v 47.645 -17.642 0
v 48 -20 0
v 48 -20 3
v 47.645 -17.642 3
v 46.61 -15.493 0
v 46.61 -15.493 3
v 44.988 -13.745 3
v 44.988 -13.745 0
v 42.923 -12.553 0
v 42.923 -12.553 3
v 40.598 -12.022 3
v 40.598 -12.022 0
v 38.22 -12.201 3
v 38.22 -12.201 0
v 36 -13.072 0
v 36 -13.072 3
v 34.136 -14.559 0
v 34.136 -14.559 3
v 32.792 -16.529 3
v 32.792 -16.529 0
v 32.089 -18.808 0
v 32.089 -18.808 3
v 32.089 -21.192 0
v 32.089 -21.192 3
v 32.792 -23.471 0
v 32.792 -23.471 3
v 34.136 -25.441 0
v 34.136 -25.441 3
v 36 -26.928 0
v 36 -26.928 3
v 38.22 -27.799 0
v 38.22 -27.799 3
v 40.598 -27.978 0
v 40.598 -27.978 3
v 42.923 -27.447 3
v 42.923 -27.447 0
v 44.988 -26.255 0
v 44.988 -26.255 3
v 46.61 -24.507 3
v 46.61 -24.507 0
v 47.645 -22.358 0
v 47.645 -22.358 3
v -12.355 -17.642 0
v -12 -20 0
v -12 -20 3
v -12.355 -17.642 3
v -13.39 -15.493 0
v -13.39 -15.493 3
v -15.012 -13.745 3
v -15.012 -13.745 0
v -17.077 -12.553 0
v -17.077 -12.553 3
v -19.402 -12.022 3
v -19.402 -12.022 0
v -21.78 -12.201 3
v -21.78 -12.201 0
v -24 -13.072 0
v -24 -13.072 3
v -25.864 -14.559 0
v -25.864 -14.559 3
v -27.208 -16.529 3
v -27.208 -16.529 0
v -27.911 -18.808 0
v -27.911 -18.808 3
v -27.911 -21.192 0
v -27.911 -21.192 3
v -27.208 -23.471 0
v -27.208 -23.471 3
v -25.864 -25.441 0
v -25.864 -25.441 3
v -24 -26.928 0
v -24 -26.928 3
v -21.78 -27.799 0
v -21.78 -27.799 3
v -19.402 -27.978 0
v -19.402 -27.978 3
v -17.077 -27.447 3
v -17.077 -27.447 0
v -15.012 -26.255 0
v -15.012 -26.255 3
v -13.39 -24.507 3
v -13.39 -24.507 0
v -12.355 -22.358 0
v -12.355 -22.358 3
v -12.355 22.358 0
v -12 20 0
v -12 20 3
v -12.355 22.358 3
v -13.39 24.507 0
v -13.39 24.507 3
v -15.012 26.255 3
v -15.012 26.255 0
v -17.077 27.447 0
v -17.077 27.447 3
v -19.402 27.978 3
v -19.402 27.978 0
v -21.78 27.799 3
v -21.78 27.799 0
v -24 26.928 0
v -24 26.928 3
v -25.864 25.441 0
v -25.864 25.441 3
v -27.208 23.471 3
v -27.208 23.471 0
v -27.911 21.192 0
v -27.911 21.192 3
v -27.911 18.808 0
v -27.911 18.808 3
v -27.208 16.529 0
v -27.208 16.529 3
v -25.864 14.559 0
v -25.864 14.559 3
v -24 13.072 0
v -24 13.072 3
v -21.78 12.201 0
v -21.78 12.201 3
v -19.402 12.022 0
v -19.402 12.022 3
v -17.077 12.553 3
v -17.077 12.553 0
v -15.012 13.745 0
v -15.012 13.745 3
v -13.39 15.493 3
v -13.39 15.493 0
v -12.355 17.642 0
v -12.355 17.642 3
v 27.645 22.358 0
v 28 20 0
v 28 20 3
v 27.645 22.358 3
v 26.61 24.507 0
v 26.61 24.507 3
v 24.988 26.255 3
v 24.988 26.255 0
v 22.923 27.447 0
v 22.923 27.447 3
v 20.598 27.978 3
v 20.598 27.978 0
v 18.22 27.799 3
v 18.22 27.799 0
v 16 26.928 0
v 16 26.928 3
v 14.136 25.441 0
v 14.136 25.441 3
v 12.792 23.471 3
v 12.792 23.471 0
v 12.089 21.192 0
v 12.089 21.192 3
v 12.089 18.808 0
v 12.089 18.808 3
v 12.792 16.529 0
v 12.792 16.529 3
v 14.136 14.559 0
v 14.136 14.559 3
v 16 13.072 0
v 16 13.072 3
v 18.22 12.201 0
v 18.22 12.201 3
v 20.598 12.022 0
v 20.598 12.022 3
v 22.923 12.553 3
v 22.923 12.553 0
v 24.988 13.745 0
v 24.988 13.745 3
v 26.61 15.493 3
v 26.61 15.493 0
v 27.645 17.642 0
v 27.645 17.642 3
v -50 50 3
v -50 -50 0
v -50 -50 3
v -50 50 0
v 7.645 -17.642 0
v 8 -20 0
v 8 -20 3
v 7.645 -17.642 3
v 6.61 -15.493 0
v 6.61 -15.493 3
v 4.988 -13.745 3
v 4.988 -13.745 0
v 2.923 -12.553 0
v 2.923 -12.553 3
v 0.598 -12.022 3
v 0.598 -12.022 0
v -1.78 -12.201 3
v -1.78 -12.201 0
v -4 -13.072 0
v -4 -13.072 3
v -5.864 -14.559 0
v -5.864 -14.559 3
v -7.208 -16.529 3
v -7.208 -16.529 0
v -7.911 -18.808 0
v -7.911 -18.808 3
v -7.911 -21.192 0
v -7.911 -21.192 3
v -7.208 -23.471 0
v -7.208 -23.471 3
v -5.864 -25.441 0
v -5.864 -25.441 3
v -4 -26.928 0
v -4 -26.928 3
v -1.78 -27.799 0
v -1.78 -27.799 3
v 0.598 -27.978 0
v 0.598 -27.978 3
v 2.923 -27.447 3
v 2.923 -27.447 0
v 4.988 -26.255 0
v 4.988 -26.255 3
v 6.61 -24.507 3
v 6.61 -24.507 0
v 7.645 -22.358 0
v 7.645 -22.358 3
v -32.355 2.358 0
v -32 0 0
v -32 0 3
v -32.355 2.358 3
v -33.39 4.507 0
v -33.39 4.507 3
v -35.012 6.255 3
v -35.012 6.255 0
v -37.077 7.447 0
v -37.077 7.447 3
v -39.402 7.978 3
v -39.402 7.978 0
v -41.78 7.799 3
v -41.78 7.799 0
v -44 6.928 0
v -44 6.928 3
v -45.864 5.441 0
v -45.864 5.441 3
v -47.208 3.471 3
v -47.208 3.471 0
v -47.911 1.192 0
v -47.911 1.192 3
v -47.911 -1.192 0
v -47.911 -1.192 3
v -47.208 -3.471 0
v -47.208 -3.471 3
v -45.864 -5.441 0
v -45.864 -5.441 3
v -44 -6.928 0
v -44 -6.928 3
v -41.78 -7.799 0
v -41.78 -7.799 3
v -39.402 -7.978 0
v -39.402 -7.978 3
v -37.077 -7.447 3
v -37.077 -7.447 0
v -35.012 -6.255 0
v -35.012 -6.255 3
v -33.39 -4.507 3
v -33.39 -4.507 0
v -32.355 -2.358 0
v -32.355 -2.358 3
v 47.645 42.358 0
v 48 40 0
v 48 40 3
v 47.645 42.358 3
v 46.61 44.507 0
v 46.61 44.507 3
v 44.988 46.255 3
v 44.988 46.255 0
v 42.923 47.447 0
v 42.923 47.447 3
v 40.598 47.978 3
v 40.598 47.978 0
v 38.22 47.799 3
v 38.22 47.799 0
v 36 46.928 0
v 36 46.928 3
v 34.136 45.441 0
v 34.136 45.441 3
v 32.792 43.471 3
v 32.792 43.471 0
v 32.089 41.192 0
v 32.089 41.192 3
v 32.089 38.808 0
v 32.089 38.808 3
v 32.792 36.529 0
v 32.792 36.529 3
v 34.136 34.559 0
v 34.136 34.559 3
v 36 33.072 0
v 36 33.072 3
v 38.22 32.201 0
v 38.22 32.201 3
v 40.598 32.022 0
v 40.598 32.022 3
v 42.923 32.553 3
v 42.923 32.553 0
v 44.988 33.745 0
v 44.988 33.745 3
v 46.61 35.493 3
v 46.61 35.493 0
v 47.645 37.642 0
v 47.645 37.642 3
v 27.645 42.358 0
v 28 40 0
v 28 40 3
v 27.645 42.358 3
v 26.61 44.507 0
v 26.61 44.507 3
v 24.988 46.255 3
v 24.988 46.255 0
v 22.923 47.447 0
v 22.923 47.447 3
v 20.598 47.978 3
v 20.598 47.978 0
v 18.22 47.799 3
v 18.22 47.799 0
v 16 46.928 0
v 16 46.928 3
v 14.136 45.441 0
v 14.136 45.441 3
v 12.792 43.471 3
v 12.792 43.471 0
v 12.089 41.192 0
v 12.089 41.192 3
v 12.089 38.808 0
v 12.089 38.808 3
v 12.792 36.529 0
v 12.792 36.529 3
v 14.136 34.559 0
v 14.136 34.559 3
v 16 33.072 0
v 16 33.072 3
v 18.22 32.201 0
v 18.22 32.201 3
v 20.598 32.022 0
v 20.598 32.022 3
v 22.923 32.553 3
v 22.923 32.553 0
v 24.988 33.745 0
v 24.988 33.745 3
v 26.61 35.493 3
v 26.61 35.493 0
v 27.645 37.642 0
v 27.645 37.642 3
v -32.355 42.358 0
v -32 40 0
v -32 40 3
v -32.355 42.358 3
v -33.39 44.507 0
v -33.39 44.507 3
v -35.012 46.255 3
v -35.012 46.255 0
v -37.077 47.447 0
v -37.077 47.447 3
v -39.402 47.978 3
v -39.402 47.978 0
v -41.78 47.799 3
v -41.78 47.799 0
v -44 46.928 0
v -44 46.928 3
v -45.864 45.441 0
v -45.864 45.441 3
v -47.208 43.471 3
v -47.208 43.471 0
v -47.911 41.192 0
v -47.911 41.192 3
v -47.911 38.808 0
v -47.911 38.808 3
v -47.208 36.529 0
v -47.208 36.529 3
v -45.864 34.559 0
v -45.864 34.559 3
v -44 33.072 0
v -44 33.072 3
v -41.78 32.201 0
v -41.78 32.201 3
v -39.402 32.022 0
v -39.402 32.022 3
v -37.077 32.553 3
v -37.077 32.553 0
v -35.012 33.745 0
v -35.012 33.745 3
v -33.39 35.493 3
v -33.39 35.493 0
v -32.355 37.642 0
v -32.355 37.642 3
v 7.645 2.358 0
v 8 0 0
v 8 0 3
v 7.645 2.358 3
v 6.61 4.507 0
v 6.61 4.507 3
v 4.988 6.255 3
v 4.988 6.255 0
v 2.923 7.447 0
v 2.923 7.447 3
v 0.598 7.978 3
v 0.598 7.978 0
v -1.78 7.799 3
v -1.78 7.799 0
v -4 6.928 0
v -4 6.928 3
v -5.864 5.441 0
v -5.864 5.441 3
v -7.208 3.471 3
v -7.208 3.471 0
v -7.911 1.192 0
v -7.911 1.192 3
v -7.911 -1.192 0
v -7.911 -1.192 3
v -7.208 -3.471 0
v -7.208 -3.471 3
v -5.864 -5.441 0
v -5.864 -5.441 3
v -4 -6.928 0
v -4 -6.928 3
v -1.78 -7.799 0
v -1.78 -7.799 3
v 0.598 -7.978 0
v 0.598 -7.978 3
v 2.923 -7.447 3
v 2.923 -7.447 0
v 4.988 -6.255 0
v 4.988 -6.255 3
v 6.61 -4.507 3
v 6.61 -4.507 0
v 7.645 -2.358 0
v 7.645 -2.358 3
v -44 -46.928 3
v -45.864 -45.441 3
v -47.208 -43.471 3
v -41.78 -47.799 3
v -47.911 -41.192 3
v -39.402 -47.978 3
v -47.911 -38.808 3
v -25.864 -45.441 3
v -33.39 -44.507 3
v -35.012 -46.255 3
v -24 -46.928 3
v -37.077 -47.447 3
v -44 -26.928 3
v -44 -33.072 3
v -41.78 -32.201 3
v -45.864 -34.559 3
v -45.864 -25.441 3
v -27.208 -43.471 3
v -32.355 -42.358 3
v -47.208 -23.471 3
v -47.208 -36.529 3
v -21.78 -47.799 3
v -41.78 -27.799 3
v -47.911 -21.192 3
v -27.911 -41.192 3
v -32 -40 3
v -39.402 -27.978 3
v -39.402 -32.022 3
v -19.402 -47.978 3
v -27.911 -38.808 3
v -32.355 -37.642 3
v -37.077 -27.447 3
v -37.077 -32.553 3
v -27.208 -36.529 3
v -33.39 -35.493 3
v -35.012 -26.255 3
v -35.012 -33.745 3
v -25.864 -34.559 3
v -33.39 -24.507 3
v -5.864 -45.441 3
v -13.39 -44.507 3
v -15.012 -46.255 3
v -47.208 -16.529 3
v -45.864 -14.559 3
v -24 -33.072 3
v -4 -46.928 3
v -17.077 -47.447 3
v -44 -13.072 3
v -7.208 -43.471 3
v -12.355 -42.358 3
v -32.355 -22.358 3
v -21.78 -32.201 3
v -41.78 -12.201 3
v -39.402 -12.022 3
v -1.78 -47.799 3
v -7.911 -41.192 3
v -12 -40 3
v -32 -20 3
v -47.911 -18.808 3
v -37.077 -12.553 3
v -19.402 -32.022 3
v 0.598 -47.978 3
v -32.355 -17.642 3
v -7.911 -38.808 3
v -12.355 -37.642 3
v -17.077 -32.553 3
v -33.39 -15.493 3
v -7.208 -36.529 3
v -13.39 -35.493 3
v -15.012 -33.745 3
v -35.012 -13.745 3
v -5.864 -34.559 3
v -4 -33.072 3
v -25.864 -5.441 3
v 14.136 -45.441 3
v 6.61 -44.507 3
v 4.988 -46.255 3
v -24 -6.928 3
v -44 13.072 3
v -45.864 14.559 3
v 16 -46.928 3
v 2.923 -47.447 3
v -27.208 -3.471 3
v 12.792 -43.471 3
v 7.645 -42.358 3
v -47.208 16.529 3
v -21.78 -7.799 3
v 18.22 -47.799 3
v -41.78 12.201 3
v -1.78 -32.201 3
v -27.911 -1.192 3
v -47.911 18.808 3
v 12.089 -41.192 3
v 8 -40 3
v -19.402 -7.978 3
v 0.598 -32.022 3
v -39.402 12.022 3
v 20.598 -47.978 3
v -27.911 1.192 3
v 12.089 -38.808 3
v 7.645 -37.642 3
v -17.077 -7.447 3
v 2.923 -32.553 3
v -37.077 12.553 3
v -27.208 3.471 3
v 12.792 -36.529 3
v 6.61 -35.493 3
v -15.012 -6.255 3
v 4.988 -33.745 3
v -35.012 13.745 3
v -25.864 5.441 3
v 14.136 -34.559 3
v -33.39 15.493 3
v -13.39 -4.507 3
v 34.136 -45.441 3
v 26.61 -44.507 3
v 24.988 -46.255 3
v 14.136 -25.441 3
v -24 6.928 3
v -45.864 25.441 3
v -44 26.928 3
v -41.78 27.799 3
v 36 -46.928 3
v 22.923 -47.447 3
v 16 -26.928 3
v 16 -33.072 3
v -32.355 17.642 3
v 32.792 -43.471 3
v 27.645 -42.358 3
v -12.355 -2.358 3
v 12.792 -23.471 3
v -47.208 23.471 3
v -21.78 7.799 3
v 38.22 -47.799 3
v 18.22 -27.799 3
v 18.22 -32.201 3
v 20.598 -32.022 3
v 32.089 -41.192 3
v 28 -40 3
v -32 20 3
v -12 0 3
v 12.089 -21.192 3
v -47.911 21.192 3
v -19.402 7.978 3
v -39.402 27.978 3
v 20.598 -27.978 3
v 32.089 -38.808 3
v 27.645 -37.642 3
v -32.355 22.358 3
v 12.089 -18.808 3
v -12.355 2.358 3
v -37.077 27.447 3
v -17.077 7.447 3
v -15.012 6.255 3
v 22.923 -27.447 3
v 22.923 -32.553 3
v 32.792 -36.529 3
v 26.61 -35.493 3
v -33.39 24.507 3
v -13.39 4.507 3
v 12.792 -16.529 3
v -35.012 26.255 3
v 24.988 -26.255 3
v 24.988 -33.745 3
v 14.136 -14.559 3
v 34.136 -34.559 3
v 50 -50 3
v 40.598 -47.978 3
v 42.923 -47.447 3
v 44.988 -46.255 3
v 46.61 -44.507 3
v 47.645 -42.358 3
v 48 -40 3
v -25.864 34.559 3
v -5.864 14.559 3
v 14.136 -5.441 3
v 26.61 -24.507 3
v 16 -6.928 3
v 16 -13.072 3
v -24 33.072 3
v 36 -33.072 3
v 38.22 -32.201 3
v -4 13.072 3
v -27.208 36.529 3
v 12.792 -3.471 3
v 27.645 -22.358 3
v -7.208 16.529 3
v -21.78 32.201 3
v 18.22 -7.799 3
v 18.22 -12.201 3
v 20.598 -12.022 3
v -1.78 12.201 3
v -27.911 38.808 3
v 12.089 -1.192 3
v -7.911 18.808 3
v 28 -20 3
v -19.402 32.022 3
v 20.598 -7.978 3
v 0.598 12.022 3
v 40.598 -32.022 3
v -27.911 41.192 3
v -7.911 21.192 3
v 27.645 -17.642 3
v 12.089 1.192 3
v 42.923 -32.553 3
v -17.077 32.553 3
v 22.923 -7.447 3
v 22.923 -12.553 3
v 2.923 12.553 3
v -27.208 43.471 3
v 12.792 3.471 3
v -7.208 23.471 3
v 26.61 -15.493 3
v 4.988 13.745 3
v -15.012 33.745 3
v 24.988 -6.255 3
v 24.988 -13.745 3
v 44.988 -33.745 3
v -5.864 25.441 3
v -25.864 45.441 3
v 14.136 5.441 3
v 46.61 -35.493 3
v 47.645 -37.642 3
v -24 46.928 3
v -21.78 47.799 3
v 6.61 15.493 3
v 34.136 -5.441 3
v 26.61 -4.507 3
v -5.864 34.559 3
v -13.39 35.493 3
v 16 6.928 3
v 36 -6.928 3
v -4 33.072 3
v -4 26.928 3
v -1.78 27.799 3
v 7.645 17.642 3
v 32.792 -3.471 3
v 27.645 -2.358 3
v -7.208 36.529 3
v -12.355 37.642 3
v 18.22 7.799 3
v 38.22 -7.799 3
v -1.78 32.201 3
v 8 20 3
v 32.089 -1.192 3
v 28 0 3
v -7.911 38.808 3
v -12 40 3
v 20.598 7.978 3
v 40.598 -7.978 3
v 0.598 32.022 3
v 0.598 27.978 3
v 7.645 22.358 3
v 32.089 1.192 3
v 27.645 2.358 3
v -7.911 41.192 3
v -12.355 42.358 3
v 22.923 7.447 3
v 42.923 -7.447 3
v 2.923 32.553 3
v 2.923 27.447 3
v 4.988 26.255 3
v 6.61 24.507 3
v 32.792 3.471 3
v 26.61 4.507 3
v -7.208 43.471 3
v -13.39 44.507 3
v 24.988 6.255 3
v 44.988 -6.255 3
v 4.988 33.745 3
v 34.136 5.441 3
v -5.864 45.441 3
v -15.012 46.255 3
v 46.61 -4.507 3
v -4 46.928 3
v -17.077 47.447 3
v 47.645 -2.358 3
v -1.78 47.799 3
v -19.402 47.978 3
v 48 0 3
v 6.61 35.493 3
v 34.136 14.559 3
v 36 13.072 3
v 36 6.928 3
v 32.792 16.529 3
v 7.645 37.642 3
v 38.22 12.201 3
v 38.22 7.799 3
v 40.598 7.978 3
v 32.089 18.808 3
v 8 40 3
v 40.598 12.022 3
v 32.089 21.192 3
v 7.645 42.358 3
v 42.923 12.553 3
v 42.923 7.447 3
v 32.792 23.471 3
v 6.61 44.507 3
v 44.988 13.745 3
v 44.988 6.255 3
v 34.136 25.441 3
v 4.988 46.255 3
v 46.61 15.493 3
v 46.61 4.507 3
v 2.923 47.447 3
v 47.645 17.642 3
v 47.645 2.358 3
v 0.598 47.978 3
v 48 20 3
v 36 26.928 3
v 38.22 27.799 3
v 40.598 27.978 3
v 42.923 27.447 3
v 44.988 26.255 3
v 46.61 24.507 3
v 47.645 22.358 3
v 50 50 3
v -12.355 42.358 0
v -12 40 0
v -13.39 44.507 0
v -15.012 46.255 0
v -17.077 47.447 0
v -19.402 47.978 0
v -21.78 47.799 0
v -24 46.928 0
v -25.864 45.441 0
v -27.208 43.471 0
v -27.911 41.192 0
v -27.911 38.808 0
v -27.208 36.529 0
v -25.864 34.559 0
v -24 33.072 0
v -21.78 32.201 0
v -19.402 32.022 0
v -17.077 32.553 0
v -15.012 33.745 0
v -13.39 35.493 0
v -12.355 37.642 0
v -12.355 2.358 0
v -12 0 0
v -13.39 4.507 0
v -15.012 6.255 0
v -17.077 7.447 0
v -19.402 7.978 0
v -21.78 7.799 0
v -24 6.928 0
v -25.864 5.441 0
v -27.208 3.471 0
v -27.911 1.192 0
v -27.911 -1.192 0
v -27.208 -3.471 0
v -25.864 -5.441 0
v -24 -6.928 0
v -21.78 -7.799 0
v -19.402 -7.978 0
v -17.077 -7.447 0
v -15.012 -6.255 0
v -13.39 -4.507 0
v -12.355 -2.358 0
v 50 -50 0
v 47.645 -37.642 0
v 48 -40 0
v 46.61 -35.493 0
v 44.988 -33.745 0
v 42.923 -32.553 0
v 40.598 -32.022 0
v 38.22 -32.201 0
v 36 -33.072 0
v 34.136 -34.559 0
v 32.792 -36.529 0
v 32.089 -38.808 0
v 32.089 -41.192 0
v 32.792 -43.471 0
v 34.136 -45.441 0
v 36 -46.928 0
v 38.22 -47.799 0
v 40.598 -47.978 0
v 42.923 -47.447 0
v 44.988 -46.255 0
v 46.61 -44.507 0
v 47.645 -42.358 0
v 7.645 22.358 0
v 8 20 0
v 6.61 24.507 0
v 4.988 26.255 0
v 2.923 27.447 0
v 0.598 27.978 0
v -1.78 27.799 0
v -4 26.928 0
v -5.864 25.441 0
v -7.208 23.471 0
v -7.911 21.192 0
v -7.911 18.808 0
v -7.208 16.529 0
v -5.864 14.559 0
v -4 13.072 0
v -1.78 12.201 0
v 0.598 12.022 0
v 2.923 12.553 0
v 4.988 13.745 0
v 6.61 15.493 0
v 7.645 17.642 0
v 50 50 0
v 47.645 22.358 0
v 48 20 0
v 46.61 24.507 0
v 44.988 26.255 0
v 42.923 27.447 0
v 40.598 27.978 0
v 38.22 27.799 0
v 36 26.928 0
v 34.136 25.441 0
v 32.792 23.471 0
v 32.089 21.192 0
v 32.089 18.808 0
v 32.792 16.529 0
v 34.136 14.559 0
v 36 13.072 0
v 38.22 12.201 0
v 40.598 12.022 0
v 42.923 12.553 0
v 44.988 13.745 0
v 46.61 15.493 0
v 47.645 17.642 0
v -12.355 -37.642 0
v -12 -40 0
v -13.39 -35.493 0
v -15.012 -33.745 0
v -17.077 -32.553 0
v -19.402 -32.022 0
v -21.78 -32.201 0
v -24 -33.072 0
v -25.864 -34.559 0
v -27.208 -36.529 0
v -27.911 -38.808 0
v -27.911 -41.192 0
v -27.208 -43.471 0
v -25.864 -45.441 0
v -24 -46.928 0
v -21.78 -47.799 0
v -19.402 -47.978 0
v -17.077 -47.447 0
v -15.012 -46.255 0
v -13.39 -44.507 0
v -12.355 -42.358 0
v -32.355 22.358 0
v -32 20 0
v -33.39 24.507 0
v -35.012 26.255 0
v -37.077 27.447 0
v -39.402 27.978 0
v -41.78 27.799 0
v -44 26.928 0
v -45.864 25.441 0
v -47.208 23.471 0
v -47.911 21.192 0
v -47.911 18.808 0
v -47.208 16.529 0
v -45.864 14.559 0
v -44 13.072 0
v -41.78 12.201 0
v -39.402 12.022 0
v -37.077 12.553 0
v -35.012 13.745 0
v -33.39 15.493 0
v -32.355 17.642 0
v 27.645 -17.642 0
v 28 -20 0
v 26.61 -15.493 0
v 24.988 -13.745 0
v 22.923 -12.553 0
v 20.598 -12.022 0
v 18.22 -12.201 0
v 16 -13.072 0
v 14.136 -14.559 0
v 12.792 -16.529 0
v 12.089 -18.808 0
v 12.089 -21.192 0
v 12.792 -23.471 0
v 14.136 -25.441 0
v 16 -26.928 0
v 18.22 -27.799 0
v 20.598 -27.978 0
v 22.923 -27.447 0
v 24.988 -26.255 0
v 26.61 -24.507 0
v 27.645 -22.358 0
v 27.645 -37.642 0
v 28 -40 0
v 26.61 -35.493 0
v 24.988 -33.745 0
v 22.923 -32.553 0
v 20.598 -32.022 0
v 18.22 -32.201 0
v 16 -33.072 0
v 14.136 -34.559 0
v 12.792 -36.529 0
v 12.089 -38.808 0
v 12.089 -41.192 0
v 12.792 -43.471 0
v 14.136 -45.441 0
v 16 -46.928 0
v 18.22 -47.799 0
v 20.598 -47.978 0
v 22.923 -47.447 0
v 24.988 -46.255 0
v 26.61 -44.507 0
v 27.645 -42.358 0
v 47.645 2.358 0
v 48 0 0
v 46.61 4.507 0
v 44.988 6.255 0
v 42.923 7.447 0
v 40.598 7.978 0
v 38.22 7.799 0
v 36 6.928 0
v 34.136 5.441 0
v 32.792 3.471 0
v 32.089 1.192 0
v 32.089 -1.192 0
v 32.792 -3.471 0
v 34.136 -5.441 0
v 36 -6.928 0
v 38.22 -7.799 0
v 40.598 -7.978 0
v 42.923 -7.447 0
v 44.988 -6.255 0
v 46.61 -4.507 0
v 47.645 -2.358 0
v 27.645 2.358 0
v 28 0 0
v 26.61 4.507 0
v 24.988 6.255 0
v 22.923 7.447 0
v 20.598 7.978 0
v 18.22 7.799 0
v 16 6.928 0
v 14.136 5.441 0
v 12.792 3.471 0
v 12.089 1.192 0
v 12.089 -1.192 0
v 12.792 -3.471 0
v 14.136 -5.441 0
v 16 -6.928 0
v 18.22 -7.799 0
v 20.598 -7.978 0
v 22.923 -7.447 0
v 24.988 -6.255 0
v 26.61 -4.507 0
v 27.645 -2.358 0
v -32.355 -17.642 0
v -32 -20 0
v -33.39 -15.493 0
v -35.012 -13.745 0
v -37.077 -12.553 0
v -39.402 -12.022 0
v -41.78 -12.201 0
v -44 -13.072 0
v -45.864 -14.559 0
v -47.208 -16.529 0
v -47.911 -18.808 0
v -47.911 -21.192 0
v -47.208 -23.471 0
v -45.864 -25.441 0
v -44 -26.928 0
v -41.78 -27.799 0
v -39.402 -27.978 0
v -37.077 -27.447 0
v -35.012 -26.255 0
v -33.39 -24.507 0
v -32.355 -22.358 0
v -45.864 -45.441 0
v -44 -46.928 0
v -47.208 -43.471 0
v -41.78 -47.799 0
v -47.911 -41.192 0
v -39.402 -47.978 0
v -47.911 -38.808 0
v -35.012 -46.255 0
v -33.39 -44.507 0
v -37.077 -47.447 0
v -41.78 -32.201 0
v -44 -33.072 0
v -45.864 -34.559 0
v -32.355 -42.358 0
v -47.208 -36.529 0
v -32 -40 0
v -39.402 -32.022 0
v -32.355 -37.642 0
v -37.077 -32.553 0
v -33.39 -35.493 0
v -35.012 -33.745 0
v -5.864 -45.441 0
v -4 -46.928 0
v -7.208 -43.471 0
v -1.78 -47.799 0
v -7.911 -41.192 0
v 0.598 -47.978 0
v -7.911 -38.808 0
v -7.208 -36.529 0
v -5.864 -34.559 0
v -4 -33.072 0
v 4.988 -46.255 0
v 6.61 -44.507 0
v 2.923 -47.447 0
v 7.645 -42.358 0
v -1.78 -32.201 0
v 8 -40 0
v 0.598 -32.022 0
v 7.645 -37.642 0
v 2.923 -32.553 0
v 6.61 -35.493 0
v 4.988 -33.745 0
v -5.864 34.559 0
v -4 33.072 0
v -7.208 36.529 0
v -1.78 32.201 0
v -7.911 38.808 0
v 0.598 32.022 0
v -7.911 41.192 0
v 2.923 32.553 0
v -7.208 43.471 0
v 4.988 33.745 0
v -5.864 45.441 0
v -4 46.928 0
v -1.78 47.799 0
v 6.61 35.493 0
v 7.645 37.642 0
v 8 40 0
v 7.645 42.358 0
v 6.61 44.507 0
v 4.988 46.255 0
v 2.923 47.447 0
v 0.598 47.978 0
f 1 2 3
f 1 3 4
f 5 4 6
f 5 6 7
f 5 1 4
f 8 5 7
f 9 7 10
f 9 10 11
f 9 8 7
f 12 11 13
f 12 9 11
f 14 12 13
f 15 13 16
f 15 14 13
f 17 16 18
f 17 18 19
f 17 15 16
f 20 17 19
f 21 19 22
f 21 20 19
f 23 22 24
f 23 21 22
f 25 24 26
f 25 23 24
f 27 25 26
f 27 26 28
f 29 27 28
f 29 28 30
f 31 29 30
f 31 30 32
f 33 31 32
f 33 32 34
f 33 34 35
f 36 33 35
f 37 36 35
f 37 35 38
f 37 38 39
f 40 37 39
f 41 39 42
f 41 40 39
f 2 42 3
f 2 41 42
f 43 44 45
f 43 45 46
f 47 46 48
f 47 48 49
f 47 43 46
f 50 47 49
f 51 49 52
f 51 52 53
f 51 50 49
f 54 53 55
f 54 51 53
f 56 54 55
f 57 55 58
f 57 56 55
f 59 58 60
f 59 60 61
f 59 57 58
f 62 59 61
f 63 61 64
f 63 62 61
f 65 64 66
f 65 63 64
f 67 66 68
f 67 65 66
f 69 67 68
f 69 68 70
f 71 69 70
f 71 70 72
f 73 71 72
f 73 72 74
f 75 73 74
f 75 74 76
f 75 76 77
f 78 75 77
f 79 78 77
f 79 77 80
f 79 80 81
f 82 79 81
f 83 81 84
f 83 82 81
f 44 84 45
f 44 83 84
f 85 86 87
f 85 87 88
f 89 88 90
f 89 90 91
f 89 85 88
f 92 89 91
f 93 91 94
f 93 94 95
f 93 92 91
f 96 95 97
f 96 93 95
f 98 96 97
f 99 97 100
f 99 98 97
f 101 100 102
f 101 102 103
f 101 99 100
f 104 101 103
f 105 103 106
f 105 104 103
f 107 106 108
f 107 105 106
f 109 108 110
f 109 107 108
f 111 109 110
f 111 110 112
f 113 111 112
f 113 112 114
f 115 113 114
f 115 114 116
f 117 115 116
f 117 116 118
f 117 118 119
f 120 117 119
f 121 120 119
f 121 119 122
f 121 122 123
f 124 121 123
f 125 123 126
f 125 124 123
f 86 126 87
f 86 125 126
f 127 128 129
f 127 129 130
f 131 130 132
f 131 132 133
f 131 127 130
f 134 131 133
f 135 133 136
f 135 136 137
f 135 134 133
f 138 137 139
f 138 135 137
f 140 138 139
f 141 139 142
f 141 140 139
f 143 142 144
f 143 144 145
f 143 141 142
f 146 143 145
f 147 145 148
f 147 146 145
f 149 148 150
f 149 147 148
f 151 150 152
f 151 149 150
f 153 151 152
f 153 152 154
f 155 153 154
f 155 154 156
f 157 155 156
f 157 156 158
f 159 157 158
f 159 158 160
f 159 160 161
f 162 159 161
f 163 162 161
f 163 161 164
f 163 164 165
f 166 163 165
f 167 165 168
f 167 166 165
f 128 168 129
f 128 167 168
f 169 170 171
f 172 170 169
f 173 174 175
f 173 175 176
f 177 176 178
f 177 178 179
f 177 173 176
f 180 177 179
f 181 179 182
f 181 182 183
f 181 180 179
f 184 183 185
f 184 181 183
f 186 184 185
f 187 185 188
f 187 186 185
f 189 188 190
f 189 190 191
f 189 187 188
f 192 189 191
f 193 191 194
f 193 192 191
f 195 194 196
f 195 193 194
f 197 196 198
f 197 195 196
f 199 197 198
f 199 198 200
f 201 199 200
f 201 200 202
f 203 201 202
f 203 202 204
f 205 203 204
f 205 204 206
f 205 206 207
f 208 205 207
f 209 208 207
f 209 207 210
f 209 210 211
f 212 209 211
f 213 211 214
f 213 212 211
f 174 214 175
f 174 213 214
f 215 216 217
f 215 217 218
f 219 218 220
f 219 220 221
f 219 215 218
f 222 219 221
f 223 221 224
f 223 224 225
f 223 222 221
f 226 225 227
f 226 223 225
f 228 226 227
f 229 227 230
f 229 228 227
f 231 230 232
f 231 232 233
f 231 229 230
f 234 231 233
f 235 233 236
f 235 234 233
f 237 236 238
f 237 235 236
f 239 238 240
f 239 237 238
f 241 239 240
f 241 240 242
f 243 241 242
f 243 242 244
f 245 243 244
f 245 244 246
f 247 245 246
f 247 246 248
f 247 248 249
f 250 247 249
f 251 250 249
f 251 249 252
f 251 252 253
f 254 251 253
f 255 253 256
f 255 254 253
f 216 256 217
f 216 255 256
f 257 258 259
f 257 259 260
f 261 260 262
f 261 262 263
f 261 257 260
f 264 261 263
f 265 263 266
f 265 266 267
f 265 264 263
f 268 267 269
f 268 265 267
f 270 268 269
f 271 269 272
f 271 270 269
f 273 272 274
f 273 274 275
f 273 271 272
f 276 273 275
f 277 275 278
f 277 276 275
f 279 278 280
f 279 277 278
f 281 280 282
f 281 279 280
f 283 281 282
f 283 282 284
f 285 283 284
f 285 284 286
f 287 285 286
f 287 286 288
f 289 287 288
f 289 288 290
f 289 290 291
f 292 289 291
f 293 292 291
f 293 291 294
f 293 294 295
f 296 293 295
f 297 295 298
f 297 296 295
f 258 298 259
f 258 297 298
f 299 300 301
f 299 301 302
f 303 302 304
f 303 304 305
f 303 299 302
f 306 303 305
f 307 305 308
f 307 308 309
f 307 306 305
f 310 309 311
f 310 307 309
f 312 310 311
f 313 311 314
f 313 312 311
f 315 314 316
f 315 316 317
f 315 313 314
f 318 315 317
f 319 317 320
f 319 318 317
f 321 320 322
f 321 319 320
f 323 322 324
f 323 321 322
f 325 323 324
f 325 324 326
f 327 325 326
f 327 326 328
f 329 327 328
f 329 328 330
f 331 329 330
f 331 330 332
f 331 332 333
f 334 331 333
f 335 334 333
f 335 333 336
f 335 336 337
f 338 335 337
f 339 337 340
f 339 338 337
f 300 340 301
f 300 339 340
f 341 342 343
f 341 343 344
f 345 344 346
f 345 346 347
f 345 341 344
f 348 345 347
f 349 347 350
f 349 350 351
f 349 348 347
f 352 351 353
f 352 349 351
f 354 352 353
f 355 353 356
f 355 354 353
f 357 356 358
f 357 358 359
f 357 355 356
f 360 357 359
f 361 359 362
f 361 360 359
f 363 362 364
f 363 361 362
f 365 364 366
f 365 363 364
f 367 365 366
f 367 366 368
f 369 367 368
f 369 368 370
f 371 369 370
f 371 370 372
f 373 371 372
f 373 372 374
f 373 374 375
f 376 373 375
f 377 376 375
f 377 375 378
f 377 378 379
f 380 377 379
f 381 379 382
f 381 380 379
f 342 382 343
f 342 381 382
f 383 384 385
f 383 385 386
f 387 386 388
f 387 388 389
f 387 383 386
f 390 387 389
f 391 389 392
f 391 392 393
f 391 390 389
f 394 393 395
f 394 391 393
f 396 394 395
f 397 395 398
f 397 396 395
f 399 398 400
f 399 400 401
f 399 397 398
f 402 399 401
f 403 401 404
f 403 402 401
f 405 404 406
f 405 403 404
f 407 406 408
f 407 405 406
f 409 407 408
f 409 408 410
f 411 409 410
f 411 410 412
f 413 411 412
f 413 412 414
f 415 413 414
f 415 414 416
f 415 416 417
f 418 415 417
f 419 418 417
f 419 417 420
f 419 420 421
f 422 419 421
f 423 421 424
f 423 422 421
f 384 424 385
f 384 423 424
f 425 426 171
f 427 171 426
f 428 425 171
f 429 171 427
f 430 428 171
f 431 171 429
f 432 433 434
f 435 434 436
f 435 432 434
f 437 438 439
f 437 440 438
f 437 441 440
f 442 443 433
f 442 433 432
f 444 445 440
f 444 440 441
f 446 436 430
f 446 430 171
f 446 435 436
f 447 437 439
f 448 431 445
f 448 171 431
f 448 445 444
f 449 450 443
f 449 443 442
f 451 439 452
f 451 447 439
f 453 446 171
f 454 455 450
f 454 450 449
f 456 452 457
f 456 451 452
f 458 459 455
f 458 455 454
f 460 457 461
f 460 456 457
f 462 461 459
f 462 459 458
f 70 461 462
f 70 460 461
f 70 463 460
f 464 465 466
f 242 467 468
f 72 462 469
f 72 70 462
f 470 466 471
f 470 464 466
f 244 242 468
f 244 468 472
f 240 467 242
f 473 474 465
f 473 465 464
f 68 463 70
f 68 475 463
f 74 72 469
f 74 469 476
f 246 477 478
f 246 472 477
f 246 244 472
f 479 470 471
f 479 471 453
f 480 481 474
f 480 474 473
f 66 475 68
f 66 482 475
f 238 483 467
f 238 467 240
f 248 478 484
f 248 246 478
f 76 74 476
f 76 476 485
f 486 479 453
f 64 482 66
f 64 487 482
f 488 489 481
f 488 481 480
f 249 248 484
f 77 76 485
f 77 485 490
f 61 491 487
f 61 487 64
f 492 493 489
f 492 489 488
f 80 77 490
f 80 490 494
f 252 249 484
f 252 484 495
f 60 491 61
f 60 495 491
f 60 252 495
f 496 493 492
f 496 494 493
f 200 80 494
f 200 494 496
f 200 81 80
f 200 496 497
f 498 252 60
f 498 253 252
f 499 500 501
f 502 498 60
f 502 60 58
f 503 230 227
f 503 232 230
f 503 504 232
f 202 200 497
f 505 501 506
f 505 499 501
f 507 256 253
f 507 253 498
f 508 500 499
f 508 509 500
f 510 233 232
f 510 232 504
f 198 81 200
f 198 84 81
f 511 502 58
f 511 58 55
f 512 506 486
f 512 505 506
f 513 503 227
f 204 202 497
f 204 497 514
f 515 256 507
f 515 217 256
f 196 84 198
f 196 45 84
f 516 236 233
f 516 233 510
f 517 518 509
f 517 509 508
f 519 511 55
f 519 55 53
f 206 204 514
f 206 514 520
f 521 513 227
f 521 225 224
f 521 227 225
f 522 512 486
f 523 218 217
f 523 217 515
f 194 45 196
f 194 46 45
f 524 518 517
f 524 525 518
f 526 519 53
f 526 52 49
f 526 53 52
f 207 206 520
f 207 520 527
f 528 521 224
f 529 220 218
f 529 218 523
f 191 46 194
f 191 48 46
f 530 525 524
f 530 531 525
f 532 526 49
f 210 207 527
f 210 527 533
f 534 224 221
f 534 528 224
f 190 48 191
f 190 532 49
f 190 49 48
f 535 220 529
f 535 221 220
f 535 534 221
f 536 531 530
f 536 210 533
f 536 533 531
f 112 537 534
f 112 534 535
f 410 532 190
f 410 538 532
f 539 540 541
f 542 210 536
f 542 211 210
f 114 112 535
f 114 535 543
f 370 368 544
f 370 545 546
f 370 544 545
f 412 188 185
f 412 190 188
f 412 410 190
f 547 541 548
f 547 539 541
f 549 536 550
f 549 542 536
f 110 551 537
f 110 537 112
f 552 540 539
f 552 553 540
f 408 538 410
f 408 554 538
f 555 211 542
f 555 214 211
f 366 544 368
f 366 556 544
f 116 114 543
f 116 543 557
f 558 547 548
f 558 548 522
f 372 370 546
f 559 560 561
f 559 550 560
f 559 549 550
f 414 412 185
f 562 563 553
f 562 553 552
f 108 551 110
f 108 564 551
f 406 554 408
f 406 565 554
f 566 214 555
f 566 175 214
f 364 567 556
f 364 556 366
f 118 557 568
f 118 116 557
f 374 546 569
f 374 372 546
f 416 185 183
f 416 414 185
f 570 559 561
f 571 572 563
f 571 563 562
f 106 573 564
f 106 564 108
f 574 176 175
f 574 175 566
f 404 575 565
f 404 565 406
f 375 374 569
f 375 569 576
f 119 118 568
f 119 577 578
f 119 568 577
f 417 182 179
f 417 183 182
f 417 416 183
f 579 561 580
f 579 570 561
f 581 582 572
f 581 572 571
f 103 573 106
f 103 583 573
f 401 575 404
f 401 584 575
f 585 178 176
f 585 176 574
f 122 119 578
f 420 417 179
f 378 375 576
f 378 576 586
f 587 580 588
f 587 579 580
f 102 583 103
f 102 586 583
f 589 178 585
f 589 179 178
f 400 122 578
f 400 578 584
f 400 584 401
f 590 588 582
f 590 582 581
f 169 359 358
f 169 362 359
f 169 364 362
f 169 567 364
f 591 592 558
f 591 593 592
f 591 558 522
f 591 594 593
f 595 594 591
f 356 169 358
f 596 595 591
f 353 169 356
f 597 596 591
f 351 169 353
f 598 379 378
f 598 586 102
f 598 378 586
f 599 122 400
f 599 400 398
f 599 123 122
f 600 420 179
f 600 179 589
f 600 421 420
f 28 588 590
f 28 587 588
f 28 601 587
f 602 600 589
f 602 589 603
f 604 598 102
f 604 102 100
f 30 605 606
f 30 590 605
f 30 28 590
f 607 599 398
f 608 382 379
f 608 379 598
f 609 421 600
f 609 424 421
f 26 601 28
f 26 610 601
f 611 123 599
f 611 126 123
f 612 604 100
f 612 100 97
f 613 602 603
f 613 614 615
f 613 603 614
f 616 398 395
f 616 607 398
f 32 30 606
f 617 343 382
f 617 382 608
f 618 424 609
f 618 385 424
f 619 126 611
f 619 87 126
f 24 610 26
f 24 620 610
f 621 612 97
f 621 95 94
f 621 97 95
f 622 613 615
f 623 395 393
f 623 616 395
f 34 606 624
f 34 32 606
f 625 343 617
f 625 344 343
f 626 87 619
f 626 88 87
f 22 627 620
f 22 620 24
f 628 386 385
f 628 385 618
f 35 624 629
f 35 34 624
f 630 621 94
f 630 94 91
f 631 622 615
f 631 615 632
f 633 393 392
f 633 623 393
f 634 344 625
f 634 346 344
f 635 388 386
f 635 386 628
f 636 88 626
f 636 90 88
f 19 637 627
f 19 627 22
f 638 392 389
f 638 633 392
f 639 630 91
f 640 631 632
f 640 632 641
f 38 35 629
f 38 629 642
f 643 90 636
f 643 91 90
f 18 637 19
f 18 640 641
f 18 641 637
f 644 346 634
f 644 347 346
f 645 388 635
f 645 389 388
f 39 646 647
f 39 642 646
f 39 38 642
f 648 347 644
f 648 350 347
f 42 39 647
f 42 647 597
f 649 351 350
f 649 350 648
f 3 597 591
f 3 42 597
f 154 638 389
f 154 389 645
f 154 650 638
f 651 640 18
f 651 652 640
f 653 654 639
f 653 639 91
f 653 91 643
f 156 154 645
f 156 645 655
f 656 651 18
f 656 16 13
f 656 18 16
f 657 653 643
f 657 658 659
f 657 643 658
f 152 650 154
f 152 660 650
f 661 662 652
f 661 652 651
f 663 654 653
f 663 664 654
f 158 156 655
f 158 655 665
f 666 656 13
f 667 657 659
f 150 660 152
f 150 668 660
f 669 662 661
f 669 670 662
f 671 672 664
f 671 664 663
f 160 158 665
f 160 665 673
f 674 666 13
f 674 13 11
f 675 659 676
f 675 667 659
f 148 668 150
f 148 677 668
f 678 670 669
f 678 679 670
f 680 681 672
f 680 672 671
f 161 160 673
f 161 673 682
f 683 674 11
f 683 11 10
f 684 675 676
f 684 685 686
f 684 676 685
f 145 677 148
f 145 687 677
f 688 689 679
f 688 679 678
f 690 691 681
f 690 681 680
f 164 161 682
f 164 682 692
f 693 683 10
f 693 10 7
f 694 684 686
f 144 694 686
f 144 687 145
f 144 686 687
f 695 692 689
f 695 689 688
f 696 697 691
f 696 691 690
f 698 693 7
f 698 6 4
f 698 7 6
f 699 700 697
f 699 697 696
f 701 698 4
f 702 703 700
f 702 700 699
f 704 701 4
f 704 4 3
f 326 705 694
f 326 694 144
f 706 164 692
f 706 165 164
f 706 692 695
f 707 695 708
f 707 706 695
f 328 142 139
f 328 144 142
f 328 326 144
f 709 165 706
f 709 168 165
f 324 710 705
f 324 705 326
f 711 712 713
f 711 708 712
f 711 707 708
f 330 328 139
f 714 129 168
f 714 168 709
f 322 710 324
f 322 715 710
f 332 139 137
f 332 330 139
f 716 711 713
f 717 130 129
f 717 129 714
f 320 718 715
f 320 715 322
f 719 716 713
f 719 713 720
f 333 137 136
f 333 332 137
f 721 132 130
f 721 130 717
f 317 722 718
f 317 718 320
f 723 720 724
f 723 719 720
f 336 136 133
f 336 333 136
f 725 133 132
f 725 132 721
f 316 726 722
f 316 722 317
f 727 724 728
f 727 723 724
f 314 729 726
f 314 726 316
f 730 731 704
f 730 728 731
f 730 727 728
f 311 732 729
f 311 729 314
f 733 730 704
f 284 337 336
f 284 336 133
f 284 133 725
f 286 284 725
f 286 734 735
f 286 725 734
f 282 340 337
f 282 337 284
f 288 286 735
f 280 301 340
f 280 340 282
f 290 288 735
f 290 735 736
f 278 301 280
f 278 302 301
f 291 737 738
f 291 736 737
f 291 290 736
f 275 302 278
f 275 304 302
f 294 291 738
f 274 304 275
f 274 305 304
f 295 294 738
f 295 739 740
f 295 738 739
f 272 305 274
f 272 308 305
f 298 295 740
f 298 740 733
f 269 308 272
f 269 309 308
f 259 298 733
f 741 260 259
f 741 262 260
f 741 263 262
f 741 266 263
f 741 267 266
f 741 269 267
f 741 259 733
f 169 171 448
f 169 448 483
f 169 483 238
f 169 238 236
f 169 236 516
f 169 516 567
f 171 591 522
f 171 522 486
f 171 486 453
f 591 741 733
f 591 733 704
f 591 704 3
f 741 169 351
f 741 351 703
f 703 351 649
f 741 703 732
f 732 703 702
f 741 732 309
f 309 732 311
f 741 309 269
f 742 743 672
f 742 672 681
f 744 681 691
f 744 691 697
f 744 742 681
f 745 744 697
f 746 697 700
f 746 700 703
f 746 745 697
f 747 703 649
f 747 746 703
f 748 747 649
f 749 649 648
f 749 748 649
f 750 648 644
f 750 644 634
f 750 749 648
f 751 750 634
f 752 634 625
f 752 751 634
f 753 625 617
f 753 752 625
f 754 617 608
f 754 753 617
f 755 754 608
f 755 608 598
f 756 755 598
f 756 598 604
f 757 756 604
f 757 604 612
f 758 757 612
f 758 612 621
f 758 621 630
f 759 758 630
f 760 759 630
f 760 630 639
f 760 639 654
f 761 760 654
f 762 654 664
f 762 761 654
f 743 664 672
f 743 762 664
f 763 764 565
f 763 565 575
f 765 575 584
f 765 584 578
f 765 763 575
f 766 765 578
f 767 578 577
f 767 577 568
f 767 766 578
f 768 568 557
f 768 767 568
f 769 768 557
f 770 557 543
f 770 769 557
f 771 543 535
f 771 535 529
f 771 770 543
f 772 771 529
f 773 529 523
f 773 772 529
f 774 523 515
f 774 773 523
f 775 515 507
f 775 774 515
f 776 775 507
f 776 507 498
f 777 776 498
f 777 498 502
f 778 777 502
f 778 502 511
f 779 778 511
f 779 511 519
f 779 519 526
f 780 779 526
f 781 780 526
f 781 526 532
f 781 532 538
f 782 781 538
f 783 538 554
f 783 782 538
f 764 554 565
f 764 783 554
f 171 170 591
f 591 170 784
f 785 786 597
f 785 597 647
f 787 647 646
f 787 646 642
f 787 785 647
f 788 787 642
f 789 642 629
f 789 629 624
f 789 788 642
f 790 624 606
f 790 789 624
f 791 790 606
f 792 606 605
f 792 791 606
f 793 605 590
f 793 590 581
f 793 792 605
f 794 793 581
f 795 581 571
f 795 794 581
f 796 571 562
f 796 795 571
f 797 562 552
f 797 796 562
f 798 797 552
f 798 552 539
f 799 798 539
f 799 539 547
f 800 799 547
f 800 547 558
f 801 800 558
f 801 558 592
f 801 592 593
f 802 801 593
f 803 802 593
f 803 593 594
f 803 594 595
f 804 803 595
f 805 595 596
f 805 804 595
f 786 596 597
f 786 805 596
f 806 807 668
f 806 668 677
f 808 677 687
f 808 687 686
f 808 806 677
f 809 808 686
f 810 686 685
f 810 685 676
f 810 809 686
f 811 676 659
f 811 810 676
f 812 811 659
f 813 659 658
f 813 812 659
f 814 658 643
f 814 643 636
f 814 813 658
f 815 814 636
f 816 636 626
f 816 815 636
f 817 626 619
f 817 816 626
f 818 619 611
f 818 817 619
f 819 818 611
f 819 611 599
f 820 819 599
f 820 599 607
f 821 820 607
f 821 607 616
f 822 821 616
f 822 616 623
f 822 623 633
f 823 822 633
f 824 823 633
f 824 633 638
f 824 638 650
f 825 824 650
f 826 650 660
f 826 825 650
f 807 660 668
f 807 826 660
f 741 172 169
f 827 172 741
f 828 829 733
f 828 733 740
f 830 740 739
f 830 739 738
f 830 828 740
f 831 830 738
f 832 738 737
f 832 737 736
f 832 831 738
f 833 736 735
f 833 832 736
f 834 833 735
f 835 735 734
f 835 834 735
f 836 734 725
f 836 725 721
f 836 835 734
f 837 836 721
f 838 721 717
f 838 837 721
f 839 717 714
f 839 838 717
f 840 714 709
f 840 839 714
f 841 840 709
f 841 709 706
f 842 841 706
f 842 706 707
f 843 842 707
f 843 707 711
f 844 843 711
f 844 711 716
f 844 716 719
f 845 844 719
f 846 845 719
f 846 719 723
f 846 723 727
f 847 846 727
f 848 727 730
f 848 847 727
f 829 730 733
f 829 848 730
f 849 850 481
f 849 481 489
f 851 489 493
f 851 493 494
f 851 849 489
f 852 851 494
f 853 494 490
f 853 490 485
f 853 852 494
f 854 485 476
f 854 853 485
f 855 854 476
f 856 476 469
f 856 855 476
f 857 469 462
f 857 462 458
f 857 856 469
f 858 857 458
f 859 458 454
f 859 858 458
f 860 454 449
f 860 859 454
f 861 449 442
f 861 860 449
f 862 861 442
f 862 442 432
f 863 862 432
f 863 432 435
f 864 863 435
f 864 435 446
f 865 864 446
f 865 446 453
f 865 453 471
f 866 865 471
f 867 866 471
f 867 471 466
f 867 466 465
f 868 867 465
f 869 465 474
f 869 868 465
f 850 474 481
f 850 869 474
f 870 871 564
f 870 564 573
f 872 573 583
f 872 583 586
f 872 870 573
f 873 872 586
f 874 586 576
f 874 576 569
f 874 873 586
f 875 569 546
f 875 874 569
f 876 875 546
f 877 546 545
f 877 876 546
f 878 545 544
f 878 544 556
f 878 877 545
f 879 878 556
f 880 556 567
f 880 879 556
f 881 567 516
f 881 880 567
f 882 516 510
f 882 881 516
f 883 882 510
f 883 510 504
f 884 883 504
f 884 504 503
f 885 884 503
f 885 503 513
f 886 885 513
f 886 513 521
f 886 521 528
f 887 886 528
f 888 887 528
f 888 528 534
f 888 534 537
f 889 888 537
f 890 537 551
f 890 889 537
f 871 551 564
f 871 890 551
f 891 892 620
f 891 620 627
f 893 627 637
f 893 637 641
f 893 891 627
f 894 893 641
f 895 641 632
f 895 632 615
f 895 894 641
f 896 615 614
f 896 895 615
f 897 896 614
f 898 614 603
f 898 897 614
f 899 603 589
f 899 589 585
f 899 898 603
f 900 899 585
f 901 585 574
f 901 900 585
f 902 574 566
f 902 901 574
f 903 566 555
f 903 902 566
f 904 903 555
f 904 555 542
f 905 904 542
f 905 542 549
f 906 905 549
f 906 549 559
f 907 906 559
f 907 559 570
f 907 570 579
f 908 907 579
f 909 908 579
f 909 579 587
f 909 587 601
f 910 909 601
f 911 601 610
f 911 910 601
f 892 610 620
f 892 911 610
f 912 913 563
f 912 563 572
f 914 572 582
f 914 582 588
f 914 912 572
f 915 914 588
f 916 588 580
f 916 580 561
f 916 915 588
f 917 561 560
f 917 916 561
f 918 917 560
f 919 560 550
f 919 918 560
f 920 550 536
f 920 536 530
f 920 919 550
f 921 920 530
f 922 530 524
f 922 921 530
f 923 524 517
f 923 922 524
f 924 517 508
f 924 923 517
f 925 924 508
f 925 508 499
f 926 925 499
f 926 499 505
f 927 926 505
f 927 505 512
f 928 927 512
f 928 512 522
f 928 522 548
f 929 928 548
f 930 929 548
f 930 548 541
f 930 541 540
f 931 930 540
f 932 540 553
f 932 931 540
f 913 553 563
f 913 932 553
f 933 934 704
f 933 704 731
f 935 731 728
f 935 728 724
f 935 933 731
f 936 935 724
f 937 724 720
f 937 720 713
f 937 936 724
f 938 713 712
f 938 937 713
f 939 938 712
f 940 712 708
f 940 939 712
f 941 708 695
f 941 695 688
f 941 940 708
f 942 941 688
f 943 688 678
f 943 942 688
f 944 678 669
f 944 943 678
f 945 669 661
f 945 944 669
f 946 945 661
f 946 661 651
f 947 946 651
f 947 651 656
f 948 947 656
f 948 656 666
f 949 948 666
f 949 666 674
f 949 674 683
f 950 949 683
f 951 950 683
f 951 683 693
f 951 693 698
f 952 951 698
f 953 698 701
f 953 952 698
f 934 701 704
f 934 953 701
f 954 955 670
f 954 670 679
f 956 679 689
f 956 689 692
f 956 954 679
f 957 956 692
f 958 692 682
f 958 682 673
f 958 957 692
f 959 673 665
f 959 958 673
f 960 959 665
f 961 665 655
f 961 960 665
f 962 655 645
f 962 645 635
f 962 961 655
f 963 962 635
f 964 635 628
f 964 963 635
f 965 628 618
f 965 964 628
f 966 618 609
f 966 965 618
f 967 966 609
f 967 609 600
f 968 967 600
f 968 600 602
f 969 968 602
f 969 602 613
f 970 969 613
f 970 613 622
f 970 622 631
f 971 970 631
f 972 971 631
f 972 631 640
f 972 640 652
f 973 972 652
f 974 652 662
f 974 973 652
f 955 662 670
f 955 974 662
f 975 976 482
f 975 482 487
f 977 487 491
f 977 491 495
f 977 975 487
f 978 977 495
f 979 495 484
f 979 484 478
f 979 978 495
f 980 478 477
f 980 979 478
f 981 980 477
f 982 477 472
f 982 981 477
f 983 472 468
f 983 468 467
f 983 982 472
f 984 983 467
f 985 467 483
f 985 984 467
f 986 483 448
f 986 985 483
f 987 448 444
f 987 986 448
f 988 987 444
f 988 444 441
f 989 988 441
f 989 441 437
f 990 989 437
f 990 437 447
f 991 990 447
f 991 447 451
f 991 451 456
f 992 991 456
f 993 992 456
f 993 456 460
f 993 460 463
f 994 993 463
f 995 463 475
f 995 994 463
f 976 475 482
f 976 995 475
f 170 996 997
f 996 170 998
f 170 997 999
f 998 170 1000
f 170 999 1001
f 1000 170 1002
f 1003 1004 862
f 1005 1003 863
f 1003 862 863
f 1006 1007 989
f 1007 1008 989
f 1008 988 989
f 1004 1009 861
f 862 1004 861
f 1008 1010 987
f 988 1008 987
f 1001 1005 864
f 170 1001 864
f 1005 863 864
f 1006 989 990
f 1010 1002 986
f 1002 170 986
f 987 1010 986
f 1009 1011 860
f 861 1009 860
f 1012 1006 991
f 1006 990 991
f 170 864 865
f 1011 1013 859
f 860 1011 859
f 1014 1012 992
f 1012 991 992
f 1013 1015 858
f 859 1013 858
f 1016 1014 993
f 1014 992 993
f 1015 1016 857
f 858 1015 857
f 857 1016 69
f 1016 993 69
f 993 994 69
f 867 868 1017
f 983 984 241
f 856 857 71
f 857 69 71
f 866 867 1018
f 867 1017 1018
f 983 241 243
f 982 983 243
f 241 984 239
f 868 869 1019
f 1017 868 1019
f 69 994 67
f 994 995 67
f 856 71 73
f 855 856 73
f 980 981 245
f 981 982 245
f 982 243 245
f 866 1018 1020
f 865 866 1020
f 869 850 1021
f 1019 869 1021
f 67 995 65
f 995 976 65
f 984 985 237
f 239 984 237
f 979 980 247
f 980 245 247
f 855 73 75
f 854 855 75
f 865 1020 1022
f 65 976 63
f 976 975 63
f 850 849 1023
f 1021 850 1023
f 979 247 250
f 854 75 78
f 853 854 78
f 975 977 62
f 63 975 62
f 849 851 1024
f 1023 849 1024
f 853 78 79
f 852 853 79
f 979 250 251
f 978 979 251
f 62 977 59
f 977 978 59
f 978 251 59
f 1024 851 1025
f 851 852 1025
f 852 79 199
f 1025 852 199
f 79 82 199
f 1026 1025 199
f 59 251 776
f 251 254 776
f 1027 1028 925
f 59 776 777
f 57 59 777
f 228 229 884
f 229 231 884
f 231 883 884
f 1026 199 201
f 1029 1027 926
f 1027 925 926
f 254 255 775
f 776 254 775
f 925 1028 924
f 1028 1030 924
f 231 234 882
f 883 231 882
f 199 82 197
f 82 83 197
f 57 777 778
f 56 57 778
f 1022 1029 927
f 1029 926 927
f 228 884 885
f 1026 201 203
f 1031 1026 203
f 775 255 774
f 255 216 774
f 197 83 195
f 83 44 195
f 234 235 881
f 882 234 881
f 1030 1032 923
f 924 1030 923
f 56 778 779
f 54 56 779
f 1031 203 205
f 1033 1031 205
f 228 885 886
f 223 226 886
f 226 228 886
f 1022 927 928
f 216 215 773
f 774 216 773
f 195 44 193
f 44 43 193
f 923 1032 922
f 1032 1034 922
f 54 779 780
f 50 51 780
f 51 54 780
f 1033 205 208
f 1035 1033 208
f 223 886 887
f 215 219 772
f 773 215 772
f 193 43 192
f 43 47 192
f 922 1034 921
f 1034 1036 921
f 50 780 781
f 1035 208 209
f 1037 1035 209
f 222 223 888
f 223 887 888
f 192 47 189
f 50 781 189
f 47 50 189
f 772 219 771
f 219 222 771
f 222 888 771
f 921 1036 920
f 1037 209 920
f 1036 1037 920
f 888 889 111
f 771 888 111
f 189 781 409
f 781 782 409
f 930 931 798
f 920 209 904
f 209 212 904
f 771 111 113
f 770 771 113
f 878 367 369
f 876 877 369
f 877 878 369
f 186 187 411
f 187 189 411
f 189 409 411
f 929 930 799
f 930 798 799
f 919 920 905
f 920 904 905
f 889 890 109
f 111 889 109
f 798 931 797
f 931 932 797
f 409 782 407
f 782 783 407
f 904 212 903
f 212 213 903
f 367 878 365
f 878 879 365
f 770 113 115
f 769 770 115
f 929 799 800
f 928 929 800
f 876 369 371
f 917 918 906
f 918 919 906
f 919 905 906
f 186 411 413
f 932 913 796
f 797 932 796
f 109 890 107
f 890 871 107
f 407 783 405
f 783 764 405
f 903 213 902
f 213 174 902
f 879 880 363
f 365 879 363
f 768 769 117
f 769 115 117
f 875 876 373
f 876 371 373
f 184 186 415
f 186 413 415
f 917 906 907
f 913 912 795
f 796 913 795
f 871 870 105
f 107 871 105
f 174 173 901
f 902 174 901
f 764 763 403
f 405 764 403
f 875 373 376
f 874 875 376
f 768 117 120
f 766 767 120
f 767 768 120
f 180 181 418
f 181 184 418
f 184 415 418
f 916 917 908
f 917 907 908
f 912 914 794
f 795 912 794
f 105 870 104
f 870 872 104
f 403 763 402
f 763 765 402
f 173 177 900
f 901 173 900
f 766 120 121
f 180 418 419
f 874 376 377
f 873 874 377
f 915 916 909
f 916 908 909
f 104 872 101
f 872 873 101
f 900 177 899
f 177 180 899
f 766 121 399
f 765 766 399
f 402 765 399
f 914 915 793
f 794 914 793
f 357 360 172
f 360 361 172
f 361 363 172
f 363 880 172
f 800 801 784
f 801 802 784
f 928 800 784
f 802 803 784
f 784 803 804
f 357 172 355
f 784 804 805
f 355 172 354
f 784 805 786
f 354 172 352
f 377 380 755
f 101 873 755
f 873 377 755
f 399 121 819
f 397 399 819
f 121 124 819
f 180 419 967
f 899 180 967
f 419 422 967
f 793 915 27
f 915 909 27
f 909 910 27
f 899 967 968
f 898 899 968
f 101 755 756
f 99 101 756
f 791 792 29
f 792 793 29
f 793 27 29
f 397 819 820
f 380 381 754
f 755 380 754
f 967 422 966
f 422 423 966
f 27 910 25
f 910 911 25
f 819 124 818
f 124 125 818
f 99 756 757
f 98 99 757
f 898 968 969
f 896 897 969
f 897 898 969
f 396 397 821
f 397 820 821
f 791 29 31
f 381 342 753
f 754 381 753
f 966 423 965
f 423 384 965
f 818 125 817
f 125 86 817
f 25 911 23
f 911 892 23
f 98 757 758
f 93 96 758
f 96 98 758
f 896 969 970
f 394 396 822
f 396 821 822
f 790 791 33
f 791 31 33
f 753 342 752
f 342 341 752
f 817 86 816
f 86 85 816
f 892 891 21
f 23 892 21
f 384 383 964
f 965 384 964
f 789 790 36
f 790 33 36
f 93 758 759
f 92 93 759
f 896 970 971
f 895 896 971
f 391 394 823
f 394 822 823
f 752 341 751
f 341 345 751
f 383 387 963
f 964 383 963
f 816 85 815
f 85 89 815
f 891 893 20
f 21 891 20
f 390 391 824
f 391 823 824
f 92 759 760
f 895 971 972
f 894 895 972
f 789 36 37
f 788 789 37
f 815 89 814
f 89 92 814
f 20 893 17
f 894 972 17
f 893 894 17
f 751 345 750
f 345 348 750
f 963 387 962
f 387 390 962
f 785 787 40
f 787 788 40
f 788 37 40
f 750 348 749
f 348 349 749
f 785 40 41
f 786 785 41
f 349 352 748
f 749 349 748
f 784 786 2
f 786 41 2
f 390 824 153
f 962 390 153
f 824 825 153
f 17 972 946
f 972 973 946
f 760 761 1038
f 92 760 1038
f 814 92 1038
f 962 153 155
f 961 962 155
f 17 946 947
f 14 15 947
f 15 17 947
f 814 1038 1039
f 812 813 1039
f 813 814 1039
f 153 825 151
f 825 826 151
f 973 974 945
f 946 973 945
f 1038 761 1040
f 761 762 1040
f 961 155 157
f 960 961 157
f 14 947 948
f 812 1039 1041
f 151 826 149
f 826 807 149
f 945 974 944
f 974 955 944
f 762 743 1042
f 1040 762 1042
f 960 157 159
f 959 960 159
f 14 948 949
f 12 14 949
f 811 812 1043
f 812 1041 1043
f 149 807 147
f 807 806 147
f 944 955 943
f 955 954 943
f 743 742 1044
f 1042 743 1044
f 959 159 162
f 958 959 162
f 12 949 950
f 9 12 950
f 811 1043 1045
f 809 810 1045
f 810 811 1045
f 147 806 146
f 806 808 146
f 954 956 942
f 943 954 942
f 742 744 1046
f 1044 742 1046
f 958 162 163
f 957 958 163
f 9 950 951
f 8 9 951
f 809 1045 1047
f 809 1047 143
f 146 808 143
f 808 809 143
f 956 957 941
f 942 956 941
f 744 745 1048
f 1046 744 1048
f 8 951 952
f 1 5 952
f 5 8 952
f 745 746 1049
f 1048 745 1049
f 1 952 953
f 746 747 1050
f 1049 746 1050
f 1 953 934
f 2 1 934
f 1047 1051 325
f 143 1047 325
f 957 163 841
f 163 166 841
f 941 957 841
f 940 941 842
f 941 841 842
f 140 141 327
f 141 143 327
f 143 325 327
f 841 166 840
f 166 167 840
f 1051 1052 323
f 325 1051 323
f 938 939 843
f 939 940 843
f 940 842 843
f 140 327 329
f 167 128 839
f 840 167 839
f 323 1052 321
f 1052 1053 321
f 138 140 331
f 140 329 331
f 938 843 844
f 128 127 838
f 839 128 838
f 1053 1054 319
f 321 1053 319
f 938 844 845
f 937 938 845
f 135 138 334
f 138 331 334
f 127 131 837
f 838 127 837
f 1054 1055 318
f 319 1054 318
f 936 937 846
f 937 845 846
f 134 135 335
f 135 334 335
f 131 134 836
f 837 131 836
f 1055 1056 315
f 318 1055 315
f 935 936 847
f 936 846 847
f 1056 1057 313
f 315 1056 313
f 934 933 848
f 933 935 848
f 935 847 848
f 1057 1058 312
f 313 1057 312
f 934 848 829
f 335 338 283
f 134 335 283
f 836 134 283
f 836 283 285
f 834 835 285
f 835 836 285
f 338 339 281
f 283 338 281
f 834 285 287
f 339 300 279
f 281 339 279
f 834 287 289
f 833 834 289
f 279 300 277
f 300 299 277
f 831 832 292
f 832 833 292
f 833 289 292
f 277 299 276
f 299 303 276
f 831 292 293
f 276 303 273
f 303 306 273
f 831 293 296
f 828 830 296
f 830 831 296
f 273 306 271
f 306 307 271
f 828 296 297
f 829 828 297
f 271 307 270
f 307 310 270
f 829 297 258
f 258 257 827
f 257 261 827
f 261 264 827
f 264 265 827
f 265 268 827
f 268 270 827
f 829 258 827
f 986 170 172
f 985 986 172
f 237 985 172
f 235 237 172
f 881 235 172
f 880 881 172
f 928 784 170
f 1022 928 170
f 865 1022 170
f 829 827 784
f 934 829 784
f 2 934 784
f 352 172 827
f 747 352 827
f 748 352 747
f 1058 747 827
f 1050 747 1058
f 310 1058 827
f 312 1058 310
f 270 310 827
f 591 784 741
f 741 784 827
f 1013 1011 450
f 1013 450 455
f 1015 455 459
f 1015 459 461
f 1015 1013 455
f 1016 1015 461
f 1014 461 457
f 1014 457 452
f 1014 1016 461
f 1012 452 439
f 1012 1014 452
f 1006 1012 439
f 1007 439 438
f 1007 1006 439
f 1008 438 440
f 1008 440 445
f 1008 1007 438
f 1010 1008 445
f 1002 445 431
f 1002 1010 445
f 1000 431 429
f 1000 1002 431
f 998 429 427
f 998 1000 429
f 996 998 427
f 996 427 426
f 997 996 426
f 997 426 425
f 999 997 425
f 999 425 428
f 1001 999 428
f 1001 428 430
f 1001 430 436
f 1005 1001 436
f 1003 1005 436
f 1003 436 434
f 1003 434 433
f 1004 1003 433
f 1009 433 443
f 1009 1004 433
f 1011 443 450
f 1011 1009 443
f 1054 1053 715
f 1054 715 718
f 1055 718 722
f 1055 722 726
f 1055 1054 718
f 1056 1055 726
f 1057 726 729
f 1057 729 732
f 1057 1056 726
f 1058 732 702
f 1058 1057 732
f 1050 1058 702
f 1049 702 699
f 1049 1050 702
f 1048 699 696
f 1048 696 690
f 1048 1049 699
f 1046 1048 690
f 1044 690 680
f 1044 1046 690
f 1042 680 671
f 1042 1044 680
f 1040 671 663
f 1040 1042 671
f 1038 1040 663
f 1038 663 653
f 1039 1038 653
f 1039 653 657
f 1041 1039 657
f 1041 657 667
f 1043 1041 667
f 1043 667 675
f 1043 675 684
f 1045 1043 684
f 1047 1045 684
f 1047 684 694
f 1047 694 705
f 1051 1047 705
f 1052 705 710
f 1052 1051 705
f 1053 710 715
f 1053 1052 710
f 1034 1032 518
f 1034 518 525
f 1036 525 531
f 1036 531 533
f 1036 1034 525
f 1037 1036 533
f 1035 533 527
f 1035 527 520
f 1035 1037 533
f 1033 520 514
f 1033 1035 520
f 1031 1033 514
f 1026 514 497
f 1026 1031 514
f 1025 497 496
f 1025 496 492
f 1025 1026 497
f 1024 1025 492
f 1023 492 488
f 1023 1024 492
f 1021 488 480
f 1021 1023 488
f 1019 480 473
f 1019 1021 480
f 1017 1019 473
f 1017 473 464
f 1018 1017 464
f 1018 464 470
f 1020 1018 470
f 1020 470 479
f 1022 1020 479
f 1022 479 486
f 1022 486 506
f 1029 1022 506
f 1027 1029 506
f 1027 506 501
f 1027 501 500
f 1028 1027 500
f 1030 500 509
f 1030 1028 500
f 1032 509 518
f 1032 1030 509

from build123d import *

# Parameters (mm, degrees)
F0_W     = 100
F0_H     = 100
F0_R     = 8
F1_DEPTH = 3


with BuildPart() as f1:
    # F0 (on Top) → F1 (new body)
    with BuildSketch(Plane.XY):
        Rectangle(F0_W, F0_H)
        with Locations((-40, -40)):
            Circle(F0_R, mode=Mode.SUBTRACT)
        with Locations((-20, -40)):
            Circle(F0_R, mode=Mode.SUBTRACT)
        with Locations((-40, -20)):
            Circle(F0_R, mode=Mode.SUBTRACT)
        with Locations((-20, -20)):
            Circle(F0_R, mode=Mode.SUBTRACT)
        with Locations((0, -40)):
            Circle(F0_R, mode=Mode.SUBTRACT)
        with Locations((20, -40)):
            Circle(F0_R, mode=Mode.SUBTRACT)
        with Locations((40, -40)):
            Circle(F0_R, mode=Mode.SUBTRACT)
        with Locations((0, -20)):
            Circle(F0_R, mode=Mode.SUBTRACT)
        with Locations((20, -20)):
            Circle(F0_R, mode=Mode.SUBTRACT)
        with Locations((40, -20)):
            Circle(F0_R, mode=Mode.SUBTRACT)
        with Locations((-40, 0)):
            Circle(F0_R, mode=Mode.SUBTRACT)
        with Locations((-40, 20)):
            Circle(F0_R, mode=Mode.SUBTRACT)
        with Locations((-20, 0)):
            Circle(F0_R, mode=Mode.SUBTRACT)
        with Locations((-20, 20)):
            Circle(F0_R, mode=Mode.SUBTRACT)
        with Locations((-40, 40)):
            Circle(F0_R, mode=Mode.SUBTRACT)
        with Locations((-20, 40)):
            Circle(F0_R, mode=Mode.SUBTRACT)
        Circle(F0_R, mode=Mode.SUBTRACT)
        with Locations((20, 0)):
            Circle(F0_R, mode=Mode.SUBTRACT)
        with Locations((0, 20)):
            Circle(F0_R, mode=Mode.SUBTRACT)
        with Locations((20, 20)):
            Circle(F0_R, mode=Mode.SUBTRACT)
        with Locations((40, 0)):
            Circle(F0_R, mode=Mode.SUBTRACT)
        with Locations((40, 20)):
            Circle(F0_R, mode=Mode.SUBTRACT)
        with Locations((0, 40)):
            Circle(F0_R, mode=Mode.SUBTRACT)
        with Locations((20, 40)):
            Circle(F0_R, mode=Mode.SUBTRACT)
        with Locations((40, 40)):
            Circle(F0_R, mode=Mode.SUBTRACT)
    extrude(amount=F1_DEPTH)


solid = f1.part
